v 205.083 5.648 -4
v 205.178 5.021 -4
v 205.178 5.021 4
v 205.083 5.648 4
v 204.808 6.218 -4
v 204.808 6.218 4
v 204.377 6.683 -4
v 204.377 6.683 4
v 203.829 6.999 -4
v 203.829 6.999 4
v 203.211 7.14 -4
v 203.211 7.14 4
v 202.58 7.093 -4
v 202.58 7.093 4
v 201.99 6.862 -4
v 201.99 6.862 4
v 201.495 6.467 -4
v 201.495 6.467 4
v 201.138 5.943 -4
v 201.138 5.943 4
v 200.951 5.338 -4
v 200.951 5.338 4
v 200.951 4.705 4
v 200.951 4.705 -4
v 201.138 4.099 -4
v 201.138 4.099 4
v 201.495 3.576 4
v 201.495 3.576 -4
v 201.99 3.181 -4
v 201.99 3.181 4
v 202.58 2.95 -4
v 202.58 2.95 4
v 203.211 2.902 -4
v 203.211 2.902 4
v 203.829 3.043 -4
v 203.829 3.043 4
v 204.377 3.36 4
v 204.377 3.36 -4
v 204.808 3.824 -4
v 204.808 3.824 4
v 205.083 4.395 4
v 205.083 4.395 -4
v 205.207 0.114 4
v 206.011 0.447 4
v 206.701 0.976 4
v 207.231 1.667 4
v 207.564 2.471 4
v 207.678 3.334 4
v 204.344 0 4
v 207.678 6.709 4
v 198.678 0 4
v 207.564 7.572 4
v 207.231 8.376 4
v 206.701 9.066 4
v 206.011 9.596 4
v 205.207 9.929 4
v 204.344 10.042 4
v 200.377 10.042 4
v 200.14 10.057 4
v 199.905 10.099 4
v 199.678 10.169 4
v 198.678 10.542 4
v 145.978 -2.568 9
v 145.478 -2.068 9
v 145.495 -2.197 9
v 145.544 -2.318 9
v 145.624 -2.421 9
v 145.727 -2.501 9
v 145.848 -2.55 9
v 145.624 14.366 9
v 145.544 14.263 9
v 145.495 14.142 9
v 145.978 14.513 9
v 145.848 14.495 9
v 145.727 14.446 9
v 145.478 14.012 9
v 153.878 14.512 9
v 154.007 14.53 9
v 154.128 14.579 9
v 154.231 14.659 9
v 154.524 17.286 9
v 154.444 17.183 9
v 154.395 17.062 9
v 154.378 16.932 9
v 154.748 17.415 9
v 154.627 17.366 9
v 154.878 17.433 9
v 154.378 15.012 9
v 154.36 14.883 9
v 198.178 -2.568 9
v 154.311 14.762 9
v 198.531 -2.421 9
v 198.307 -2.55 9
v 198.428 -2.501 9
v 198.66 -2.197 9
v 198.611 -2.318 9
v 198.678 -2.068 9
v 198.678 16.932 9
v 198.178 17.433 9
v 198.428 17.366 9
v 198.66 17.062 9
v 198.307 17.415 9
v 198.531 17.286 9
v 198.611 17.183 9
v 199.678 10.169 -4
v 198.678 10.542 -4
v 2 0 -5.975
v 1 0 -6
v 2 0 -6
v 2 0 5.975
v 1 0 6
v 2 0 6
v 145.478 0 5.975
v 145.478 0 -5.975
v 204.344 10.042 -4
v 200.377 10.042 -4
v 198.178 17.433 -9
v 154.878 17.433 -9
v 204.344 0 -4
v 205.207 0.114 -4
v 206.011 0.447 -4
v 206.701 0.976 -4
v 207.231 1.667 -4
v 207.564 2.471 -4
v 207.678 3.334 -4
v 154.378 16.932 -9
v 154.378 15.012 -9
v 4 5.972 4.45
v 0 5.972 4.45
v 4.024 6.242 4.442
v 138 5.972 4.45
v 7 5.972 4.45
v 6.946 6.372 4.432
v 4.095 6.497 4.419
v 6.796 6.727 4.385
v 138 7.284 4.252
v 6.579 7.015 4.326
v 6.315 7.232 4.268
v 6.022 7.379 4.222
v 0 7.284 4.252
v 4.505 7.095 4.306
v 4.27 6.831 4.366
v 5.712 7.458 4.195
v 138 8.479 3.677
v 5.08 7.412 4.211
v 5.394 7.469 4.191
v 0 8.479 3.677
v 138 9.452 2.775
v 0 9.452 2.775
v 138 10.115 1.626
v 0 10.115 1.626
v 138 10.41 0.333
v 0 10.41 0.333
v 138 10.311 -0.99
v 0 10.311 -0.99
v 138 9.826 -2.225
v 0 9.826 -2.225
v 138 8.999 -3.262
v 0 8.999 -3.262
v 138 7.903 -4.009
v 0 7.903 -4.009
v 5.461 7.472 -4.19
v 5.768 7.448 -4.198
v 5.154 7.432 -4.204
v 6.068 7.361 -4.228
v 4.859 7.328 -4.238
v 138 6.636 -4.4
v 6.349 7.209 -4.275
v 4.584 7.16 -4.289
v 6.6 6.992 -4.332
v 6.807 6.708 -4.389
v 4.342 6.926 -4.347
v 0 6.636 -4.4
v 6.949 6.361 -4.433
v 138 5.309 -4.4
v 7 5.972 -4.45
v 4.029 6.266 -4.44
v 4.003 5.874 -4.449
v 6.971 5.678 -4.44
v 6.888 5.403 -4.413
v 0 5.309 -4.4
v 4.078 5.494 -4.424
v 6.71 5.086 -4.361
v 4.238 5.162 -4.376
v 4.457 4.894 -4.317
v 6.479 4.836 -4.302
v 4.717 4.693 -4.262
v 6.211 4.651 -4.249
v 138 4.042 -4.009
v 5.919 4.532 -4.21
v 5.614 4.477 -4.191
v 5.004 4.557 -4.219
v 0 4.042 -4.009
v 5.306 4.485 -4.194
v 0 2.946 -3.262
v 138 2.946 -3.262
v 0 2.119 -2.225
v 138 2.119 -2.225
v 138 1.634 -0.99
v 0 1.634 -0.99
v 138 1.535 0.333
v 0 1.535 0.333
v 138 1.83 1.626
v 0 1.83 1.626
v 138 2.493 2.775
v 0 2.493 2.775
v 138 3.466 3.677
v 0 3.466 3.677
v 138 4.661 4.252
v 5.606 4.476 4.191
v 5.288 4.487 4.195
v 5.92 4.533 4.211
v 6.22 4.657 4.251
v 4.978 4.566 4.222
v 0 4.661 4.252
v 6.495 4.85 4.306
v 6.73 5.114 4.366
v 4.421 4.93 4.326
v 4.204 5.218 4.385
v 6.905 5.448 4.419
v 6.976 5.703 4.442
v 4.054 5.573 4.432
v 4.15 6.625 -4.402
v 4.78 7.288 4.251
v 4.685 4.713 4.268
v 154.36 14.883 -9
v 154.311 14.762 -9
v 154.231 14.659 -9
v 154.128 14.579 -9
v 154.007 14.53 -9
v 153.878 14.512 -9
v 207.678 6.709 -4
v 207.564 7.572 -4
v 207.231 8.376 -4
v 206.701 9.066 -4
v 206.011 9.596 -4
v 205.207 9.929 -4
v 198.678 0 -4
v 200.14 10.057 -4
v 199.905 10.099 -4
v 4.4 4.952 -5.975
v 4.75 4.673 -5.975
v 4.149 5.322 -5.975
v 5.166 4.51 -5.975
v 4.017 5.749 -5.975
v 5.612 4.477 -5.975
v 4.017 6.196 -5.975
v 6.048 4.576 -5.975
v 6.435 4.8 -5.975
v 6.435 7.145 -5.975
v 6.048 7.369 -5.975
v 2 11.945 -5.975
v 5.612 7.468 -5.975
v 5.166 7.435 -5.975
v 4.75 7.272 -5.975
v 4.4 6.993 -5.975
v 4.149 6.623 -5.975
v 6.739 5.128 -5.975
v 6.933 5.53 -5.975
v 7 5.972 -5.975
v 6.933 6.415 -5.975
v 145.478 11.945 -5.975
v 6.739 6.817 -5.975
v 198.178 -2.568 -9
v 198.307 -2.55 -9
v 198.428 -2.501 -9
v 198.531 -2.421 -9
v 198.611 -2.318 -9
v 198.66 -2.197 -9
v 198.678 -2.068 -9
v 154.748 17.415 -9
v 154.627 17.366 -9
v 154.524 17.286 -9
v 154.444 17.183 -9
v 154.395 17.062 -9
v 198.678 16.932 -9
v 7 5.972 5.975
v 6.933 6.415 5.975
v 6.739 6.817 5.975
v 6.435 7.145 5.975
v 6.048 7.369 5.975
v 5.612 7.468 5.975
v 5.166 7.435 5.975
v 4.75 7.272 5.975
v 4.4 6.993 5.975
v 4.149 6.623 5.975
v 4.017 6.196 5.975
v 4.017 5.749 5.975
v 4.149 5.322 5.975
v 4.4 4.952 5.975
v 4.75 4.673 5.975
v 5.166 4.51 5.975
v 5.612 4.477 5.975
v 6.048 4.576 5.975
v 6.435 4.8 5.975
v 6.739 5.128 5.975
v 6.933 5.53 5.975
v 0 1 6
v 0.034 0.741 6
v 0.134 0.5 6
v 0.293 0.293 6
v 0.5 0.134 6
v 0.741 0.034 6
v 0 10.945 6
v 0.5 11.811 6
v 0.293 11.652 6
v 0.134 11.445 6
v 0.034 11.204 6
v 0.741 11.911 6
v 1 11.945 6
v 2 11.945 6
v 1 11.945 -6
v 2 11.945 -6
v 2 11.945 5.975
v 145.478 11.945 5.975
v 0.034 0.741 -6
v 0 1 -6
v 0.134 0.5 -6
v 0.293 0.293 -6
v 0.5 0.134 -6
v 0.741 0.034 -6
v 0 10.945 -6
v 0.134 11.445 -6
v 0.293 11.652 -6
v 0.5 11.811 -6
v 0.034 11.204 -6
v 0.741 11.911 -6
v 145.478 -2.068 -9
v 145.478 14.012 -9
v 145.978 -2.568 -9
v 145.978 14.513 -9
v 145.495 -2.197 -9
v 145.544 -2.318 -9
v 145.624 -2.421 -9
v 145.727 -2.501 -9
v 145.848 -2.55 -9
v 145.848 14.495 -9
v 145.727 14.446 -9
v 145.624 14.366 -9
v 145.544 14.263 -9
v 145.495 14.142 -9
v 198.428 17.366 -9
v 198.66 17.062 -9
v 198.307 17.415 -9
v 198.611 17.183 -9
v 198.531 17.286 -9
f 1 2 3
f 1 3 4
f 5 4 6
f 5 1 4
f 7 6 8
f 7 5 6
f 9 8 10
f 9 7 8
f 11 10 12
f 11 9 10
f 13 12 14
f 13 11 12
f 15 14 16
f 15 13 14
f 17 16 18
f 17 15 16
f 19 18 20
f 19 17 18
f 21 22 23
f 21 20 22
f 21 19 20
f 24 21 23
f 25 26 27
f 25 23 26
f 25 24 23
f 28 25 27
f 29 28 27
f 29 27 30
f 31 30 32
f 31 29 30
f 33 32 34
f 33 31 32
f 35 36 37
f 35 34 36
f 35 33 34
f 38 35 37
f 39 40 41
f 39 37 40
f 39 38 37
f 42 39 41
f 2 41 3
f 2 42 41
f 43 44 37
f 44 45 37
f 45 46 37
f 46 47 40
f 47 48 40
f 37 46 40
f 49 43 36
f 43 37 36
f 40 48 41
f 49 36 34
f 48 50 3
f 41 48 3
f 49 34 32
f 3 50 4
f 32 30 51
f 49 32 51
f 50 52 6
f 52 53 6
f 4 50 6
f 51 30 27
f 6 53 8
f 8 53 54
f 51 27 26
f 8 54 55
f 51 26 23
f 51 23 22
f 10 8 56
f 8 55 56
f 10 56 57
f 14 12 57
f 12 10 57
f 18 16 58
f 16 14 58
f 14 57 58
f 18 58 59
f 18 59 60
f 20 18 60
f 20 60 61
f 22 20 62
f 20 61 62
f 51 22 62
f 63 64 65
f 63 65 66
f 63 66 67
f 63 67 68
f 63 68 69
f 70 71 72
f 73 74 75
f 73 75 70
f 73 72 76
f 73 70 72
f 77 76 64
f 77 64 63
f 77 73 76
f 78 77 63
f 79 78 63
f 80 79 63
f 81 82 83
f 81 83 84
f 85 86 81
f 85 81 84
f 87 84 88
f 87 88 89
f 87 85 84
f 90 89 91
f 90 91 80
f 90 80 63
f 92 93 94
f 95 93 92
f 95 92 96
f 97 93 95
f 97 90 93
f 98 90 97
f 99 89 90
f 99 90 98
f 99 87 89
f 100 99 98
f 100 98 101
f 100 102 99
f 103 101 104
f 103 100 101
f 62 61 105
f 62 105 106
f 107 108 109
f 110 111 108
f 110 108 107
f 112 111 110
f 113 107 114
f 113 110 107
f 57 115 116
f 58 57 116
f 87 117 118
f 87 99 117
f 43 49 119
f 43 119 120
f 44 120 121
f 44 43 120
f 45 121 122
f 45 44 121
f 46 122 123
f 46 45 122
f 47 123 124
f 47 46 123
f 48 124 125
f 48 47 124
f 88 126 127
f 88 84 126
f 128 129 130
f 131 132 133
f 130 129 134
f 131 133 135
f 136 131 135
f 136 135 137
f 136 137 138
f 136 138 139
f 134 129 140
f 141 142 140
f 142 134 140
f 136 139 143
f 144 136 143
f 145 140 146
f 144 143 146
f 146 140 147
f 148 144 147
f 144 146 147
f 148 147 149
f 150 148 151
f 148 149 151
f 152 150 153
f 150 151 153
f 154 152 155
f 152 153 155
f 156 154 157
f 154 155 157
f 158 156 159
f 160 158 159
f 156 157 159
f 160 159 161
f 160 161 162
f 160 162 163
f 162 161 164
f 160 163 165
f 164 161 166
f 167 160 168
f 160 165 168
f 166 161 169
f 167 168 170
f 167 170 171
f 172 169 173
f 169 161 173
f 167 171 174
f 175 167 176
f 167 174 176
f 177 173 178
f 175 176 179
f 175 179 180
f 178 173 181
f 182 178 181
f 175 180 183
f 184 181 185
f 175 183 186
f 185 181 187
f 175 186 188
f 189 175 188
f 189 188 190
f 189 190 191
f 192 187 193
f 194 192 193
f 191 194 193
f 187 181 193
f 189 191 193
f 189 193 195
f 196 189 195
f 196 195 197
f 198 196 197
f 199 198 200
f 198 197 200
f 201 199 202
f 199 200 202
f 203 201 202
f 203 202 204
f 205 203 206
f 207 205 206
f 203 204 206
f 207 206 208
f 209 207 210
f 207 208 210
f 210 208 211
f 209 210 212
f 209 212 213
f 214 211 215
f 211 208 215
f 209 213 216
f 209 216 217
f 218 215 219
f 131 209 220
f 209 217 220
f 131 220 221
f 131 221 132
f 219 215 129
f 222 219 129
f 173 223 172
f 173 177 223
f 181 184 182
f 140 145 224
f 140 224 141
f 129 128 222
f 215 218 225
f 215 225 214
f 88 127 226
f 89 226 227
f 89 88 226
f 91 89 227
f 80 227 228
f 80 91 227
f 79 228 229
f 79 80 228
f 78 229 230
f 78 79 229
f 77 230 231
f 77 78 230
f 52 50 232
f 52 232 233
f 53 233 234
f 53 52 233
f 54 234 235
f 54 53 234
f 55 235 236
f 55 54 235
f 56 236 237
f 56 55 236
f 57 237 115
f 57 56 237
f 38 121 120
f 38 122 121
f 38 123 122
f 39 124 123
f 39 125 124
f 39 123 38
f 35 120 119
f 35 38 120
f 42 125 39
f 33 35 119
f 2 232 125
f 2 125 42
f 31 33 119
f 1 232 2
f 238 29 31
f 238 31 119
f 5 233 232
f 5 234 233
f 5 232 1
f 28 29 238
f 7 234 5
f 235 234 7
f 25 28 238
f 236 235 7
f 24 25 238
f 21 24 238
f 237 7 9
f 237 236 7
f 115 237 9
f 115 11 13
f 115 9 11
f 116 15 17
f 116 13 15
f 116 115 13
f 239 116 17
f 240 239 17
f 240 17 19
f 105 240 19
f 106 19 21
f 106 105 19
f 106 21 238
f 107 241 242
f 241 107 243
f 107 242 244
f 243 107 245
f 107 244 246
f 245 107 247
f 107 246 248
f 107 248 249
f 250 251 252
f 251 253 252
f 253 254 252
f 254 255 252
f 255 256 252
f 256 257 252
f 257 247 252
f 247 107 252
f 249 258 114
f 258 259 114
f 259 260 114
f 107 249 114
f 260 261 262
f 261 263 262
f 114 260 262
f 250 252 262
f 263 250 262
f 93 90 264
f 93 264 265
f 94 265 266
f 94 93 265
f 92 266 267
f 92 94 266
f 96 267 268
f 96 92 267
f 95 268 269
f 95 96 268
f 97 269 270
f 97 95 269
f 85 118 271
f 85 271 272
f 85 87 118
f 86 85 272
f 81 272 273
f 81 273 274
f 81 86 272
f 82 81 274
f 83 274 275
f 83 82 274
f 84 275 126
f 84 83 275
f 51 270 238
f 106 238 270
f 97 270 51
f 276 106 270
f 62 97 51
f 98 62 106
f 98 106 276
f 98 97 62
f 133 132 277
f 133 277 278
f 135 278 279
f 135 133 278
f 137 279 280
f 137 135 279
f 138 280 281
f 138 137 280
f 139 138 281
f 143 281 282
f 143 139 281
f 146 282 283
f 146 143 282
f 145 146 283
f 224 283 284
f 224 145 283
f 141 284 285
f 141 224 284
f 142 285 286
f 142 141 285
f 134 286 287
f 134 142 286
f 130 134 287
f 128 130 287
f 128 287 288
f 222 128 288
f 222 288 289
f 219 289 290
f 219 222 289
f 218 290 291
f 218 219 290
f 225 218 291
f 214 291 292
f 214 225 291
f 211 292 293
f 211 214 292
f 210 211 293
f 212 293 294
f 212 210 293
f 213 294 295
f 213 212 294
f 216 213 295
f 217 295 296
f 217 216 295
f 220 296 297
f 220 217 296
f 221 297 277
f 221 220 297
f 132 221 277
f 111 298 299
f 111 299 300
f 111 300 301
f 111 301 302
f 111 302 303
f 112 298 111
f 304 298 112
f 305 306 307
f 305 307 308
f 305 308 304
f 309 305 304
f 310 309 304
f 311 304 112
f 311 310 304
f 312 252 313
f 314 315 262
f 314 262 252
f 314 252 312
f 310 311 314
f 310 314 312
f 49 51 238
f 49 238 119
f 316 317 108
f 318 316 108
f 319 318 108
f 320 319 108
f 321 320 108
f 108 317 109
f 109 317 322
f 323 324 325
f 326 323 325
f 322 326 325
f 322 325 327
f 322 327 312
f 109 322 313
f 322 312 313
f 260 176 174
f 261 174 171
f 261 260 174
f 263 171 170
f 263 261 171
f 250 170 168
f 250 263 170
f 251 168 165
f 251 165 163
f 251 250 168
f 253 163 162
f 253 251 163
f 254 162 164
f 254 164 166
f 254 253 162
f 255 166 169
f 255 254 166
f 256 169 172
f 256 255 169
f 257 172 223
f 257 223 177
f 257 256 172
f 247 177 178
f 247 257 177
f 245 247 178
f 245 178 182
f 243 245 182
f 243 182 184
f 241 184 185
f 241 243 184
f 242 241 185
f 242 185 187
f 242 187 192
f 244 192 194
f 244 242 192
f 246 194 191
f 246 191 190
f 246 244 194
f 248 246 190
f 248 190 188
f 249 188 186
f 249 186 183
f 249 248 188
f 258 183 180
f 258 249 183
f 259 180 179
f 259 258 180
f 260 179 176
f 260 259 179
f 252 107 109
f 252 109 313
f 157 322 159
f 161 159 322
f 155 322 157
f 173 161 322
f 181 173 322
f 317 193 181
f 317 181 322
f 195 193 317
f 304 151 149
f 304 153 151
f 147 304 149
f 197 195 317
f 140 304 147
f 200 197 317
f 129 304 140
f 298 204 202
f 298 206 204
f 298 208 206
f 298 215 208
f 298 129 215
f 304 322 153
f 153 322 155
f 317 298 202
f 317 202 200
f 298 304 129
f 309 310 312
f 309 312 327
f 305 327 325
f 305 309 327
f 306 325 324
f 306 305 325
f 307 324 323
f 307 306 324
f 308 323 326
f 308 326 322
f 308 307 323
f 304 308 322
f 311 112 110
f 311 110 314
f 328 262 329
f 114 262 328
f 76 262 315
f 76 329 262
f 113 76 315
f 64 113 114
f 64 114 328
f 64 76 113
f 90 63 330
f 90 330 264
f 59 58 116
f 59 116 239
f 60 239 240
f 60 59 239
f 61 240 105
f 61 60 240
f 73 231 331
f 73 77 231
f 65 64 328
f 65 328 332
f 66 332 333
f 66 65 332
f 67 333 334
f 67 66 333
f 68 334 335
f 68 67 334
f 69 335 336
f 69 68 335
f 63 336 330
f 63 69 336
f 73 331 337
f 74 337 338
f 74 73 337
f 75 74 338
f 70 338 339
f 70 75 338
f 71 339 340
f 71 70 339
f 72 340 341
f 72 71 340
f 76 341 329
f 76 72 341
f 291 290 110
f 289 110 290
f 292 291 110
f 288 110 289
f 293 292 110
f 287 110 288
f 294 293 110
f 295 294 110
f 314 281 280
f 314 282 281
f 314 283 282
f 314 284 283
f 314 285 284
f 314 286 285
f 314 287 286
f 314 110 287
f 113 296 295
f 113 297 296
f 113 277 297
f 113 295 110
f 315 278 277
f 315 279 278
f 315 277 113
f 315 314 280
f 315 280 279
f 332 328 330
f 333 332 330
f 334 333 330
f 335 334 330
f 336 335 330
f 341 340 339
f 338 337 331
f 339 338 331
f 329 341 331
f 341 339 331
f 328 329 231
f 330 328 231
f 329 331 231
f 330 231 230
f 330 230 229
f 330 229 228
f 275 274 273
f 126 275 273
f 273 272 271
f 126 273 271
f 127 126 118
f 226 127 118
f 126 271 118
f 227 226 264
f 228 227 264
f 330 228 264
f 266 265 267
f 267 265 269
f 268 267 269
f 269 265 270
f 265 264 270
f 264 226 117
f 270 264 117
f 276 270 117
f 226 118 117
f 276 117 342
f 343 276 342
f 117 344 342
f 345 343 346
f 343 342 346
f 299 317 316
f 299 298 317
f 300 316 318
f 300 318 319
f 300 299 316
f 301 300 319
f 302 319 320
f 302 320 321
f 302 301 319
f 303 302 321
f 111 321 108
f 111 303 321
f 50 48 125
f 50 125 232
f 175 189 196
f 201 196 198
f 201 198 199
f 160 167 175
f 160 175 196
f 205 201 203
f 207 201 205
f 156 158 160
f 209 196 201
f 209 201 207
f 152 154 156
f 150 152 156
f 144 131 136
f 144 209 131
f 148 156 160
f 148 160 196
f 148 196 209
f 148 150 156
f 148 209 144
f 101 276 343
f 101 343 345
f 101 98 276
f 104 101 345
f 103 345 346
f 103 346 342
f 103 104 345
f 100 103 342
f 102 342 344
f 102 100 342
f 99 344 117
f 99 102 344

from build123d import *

# Parameters (mm, degrees)
SKETCH2_R           = 2.125
BOSS_EXTRUDE1_DEPTH = 9
SKETCH2_3_W         = 143.4775
SKETCH2_3_H         = 11.945
SKETCH2_3_R         = 1.5
BOSS_EXTRUDE2_DEPTH = 5.975
BOSS_EXTRUDE3_DEPTH = 6
SKETCH7_R           = 4.45
CUT_EXTRUDE4_DEPTH  = 138
CUT_EXTRUDE6_DEPTH  = 5
CUT_EXTRUDE7_DEPTH  = 5


with BuildPart() as part:
    # Sketch2 → Boss-Extrude1 (new, symmetric)
    with BuildSketch(Plane.XY):
        with BuildLine():
            Line((145.4775, 14.0125), (145.4775, 11.945))
            Line((145.4775, 11.945), (145.4775, 0))
            Line((145.4775, 0), (145.4775, -2.0675))
            ThreePointArc((145.4775, -2.0675), (145.623946609, -2.421053391), (145.9775, -2.5675))
            Line((145.9775, -2.5675), (198.1775, -2.5675))
            ThreePointArc((198.1775, -2.5675), (198.531053391, -2.421053391), (198.6775, -2.0675))
            Line((198.6775, -2.0675), (198.6775, 0))
            Line((198.6775, 0), (204.343857791, 0))
            ThreePointArc((204.343857791, 0), (206.701098803, 0.976401197), (207.6775, 3.333642209))
            Line((207.6775, 3.333642209), (207.6775, 6.708857791))
            ThreePointArc((207.6775, 6.708857791), (206.701098803, 9.066098803), (204.343857791, 10.0425))
            Line((204.343857791, 10.0425), (200.377364582, 10.0425))
            ThreePointArc((200.377364582, 10.0425), (200.021766481, 10.074366369), (199.6775, 10.168950009))
            Line((199.6775, 10.168950009), (198.6775, 10.5425))
            Line((198.6775, 10.5425), (198.6775, 16.9325))
            ThreePointArc((198.6775, 16.9325), (198.531053391, 17.286053391), (198.1775, 17.4325))
            Line((198.1775, 17.4325), (154.8775, 17.4325))
            ThreePointArc((154.8775, 17.4325), (154.523946609, 17.286053391), (154.3775, 16.9325))
            Line((154.3775, 16.9325), (154.3775, 15.0125))
            ThreePointArc((154.3775, 15.0125), (154.231053391, 14.658946609), (153.8775, 14.5125))
            Line((153.8775, 14.5125), (145.9775, 14.5125))
            ThreePointArc((145.9775, 14.5125), (145.623946609, 14.366053391), (145.4775, 14.0125))
        make_face()
        with Locations((203.0525, 5.02125)):
            Circle(SKETCH2_R, mode=Mode.SUBTRACT)
    extrude(amount=BOSS_EXTRUDE1_DEPTH, both=True)

    # Sketch2<3> → Boss-Extrude2 (add, symmetric)
    with BuildSketch(Plane.XY):
        with Locations((73.73875, 5.9725)):
            Rectangle(SKETCH2_3_W, SKETCH2_3_H)
        with Locations((5.5, 5.9725)):
            Circle(SKETCH2_3_R, mode=Mode.SUBTRACT)
    extrude(amount=BOSS_EXTRUDE2_DEPTH, both=True)

    # Sketch2<4> → Boss-Extrude3 (add, symmetric)
    with BuildSketch(Plane.XY):
        with BuildLine():
            Line((2, 0), (2, 11.945))
            Line((2, 11.945), (1, 11.945))
            ThreePointArc((1, 11.945), (0.292893219, 11.652106781), (0, 10.945))
            Line((0, 10.945), (0, 1))
            ThreePointArc((0, 1), (0.292893219, 0.292893219), (1, 0))
            Line((1, 0), (2, 0))
        make_face()
    extrude(amount=BOSS_EXTRUDE3_DEPTH, both=True)

    # Sketch7 → Cut-Extrude4 (cut)
    with BuildSketch(Plane.ZY):
        with Locations((0, 5.9725)):
            Circle(SKETCH7_R)
    extrude(amount=-CUT_EXTRUDE4_DEPTH, mode=Mode.SUBTRACT)

    # Sketch8 → Cut-Extrude6 (cut, symmetric)
    with BuildSketch(Plane.XY.offset(9)):
        Polygon((198.6775, 10.5425), (211.452070609, 15.905902501), (207.012502563, -2.059702975), (198.6775, 0), align=None)
    extrude(amount=CUT_EXTRUDE6_DEPTH, both=True, mode=Mode.SUBTRACT)

    # Sketch10 → Cut-Extrude7 (cut, symmetric)
    with BuildSketch(Plane(origin=(0, 0, -9), x_dir=(-1, 0, 0), z_dir=(0, 0, -1))):
        Polygon((-198.6775, 10.5425), (-218.686725566, 39.11278538), (-201.443333916, -35.592944689), (-198.6775, 0), align=None)
    extrude(amount=CUT_EXTRUDE7_DEPTH, both=True, mode=Mode.SUBTRACT)


solid = part.part
